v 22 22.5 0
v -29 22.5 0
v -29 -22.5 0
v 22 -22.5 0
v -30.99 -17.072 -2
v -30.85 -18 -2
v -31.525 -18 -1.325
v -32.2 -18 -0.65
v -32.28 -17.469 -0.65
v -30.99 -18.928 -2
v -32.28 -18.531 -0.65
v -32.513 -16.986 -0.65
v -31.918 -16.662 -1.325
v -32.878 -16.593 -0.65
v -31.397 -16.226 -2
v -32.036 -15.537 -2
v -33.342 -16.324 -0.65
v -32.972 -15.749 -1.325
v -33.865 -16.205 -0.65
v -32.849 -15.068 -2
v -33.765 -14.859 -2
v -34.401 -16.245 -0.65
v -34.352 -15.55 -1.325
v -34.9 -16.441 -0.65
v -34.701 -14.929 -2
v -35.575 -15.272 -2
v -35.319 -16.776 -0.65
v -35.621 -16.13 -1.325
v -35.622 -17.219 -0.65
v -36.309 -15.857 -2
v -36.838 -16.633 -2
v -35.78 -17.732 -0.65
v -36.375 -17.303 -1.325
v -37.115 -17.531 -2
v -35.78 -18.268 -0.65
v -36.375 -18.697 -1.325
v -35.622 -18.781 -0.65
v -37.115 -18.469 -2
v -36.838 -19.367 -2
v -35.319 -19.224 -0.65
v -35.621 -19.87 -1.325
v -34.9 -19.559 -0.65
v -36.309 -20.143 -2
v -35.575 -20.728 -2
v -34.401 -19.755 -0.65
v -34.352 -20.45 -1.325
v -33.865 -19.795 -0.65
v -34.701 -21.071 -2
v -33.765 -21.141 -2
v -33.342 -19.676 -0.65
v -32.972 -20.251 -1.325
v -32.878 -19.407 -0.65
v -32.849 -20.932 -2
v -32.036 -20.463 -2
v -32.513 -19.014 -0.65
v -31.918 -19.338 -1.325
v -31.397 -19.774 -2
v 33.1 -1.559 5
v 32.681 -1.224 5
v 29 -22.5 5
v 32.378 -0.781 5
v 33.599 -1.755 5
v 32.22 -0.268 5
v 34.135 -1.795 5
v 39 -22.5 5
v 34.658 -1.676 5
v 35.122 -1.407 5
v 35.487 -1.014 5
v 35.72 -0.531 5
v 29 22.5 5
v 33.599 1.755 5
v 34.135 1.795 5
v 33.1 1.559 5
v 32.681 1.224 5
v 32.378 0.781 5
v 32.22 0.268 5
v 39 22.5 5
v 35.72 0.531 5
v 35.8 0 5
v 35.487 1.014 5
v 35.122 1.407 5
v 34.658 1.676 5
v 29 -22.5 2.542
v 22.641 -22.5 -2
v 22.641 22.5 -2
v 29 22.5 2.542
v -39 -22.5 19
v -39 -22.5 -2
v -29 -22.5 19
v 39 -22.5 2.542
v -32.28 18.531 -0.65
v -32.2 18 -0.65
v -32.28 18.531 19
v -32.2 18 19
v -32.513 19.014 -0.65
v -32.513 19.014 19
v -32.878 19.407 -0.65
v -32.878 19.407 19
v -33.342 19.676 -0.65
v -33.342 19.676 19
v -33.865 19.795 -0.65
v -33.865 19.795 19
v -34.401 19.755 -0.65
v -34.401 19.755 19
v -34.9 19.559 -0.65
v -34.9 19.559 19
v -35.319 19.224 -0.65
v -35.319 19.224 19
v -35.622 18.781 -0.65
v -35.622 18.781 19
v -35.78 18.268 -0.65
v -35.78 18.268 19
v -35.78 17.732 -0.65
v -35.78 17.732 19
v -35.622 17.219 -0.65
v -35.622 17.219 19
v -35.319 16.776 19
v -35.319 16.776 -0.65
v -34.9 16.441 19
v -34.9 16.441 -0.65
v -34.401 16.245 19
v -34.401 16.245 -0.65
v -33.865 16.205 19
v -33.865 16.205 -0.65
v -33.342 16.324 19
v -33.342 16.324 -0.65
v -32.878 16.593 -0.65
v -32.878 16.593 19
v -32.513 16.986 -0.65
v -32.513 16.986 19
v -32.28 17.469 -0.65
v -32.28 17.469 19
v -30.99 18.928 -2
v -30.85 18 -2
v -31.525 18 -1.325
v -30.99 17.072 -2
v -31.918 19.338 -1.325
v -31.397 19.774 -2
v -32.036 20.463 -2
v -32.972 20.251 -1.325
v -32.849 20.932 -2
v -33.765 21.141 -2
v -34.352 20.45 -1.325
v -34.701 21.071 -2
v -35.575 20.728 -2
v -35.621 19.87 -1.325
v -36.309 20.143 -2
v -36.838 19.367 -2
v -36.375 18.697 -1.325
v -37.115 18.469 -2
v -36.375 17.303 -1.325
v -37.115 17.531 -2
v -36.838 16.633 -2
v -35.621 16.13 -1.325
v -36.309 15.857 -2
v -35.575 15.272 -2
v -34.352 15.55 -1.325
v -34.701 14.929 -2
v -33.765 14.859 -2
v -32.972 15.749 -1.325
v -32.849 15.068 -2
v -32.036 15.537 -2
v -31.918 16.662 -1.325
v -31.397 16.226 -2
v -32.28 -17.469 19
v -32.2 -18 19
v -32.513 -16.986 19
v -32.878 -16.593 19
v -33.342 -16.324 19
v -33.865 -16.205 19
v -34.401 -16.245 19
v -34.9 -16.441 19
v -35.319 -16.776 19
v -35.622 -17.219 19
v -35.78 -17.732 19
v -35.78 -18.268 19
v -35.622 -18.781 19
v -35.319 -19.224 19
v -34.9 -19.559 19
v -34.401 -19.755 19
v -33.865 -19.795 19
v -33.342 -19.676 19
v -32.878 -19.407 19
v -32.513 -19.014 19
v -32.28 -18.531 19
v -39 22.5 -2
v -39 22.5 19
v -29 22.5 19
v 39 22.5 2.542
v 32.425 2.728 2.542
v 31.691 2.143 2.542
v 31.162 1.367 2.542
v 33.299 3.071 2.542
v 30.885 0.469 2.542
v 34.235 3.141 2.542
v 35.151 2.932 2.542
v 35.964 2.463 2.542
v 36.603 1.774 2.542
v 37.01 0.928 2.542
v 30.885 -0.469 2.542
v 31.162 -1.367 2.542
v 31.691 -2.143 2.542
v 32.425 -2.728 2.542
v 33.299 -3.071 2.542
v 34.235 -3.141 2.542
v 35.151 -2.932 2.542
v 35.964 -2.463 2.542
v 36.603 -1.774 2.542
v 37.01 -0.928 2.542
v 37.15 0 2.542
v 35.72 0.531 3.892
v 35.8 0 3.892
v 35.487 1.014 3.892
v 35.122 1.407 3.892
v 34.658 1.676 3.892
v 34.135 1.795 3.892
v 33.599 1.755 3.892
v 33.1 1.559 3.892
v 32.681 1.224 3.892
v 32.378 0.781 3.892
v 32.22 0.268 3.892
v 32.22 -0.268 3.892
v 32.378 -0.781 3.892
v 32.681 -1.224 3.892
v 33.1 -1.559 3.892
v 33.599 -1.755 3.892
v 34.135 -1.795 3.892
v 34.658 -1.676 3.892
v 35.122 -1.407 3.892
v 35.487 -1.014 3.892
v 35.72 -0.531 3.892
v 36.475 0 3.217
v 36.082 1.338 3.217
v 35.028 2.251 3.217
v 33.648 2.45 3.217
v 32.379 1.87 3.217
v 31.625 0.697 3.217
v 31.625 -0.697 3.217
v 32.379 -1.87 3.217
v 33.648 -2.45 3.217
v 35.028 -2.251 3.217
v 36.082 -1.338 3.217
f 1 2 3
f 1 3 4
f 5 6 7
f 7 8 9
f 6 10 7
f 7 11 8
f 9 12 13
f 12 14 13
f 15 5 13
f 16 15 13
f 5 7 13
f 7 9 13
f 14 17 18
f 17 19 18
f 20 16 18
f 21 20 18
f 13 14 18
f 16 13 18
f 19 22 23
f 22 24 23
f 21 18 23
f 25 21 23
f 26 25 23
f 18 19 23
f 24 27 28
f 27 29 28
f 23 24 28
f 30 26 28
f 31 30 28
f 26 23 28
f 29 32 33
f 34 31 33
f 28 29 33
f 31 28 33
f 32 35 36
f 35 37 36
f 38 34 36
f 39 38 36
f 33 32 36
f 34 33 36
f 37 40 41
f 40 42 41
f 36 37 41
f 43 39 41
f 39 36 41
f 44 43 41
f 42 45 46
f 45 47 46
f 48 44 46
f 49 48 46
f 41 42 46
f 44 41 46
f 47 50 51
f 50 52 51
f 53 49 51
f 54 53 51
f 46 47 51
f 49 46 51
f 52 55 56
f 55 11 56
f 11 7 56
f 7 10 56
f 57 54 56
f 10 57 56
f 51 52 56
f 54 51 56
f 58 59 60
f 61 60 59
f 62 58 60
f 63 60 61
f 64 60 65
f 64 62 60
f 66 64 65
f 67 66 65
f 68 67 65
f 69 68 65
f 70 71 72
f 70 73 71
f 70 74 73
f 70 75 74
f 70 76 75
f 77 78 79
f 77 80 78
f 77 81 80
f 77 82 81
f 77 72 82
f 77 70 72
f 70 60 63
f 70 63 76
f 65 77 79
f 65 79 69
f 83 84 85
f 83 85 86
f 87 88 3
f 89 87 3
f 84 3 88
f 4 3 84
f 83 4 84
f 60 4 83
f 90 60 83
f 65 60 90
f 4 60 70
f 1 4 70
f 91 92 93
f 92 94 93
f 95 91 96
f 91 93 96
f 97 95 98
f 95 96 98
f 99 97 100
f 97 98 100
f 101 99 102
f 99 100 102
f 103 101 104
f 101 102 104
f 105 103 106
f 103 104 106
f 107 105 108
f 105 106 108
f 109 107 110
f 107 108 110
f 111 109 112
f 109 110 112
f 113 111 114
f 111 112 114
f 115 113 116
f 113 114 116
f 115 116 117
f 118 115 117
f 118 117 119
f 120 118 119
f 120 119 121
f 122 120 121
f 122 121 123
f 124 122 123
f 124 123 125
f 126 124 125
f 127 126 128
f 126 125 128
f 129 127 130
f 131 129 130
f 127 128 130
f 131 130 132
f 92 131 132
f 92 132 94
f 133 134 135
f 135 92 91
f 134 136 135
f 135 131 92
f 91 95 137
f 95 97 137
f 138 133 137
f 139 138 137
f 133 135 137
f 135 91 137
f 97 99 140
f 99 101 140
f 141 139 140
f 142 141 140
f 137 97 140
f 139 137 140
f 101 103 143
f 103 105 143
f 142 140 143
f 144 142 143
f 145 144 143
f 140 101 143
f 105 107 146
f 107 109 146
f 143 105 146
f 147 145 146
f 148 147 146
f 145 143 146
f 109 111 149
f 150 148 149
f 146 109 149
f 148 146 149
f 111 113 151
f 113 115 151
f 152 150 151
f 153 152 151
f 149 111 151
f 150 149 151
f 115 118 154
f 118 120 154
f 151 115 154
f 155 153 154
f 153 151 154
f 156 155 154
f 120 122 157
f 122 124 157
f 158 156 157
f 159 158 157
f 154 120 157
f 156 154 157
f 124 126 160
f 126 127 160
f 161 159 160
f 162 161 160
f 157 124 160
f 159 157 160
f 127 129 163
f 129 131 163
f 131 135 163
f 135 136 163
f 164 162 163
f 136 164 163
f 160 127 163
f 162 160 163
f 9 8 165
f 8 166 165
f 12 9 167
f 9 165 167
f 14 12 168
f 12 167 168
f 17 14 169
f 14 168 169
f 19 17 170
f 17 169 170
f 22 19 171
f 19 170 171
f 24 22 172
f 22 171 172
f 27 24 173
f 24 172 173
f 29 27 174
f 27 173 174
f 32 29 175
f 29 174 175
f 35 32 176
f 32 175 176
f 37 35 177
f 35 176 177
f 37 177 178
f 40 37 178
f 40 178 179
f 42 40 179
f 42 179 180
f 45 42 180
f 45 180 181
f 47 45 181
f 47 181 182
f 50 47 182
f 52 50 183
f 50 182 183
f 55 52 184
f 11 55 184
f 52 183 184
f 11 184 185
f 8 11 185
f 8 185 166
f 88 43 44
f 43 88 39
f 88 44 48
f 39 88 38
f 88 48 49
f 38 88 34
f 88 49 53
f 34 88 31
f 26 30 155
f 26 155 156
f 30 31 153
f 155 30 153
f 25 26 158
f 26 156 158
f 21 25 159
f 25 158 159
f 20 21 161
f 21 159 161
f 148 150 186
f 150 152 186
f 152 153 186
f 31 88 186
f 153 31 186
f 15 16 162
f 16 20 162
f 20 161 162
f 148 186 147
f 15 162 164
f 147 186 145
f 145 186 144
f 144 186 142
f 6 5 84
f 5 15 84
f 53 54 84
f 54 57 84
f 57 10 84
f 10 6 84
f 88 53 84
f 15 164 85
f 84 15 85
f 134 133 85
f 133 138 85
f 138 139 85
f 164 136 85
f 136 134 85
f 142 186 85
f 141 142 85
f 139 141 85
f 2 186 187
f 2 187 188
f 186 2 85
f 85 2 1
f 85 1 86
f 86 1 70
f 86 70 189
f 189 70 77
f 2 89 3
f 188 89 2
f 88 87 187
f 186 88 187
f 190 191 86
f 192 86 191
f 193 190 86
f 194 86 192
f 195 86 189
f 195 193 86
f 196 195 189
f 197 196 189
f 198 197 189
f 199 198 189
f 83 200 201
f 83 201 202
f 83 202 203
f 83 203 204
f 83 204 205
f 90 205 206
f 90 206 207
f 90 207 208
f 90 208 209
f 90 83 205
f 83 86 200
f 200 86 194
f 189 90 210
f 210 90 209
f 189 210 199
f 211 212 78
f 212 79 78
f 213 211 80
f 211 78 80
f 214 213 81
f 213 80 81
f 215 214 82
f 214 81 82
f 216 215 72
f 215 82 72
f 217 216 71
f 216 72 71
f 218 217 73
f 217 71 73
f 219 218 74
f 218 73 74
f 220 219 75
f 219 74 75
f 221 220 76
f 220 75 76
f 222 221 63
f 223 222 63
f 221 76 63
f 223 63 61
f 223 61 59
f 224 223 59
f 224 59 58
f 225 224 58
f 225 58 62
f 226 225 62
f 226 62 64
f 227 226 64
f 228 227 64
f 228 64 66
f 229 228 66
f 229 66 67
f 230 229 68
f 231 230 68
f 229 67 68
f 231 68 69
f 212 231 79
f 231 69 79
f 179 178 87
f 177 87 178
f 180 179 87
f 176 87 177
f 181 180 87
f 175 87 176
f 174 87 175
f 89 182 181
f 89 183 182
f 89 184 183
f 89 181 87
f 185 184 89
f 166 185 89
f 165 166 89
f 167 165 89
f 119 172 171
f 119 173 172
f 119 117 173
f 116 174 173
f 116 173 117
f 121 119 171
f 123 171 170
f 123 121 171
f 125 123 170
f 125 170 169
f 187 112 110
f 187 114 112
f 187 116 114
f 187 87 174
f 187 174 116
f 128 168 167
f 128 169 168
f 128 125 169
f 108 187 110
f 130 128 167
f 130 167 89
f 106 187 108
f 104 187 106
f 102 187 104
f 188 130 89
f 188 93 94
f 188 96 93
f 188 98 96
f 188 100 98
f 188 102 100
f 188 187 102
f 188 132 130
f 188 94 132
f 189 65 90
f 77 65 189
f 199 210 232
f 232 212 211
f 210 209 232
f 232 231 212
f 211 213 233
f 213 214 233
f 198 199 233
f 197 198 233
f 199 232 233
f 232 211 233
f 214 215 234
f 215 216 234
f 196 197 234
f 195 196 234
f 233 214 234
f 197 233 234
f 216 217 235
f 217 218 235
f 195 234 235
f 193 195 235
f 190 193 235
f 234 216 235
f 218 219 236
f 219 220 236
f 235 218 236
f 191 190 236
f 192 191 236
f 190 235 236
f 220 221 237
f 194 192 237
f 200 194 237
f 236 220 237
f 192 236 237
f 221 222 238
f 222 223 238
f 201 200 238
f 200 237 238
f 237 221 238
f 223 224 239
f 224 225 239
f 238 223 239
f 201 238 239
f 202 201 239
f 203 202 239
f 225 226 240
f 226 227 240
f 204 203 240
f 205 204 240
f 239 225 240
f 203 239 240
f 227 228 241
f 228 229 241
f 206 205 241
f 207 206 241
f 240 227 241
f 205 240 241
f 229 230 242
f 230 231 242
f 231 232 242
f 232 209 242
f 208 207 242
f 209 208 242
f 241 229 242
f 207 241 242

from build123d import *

# Parameters (mm, degrees)
SKETCH1_W                                           = 78
SKETCH1_H                                           = 45
SKETCH1_R                                           = 1.65
BOSS_EXTRUDE1_DEPTH                                 = 2
BOSS_EXTRUDE2_START                                 = 5
SKETCH1_3_W                                         = 10
SKETCH1_3_H                                         = 45
SKETCH1_3_R                                         = 1.65
BOSS_EXTRUDE2_DEPTH                                 = 5
BOSS_EXTRUDE3_START                                 = 19
SKETCH1_4_W                                         = 10
SKETCH1_4_H                                         = 45
SKETCH1_4_R                                         = 1.65
BOSS_EXTRUDE3_DEPTH                                 = 19
CHAMFER2_SIZE2                                      = 5
CHAMFER2_SIZE                                       = 7
CUT_EXTRUDE1_DEPTH                                  = 63
CSK_FOR_M3_COUNTERSUNK_FLAT_HEAD_SCREW1_D           = 3.6
CSK_FOR_M3_COUNTERSUNK_FLAT_HEAD_SCREW1_CSINK_D     = 6.3
CSK_FOR_M3_COUNTERSUNK_FLAT_HEAD_SCREW1_CSINK_ANGLE = 90
CSK_FOR_M3_COUNTERSUNK_FLAT_HEAD_SCREW2_D           = 3.6
CSK_FOR_M3_COUNTERSUNK_FLAT_HEAD_SCREW2_CSINK_D     = 6.3
CSK_FOR_M3_COUNTERSUNK_FLAT_HEAD_SCREW2_CSINK_ANGLE = 90


with BuildPart() as part:
    # Sketch1 → Boss-Extrude1 (new body)
    with BuildSketch(Plane.XY):
        Rectangle(SKETCH1_W, SKETCH1_H)
        with Locations((34, 0)):
            Circle(SKETCH1_R, mode=Mode.SUBTRACT)
        with Locations((-34, -18)):
            Circle(SKETCH1_R, mode=Mode.SUBTRACT)
        with Locations((-34, 18)):
            Circle(SKETCH1_R, mode=Mode.SUBTRACT)
    extrude(amount=-BOSS_EXTRUDE1_DEPTH)

    # Sketch1<3> → Boss-Extrude2 (add)
    # profile 1 of 2: a face of its own
    with BuildSketch(Plane.XY.offset(BOSS_EXTRUDE2_START)):
        with Locations((-34, 0)):
            Rectangle(SKETCH1_3_W, SKETCH1_3_H)
        with Locations((-34, -18)):
            Circle(SKETCH1_3_R, mode=Mode.SUBTRACT)
        with Locations((-34, 18)):
            Circle(SKETCH1_3_R, mode=Mode.SUBTRACT)
    # profile 2 of 2: a face of its own
    with BuildSketch(Plane.XY.offset(BOSS_EXTRUDE2_START)):
        with Locations((34, 0)):
            Rectangle(SKETCH1_3_W, SKETCH1_3_H)
        with Locations((34, 0)):
            Circle(SKETCH1_3_R, mode=Mode.SUBTRACT)
    extrude(amount=-BOSS_EXTRUDE2_DEPTH)

    # Sketch1<4> → Boss-Extrude3 (add)
    with BuildSketch(Plane.XY.offset(BOSS_EXTRUDE3_START)):
        with Locations((-34, 0)):
            Rectangle(SKETCH1_4_W, SKETCH1_4_H)
        with Locations((-34, -18)):
            Circle(SKETCH1_4_R, mode=Mode.SUBTRACT)
        with Locations((-34, 18)):
            Circle(SKETCH1_4_R, mode=Mode.SUBTRACT)
    extrude(amount=-BOSS_EXTRUDE3_DEPTH)

    # Chamfer2
    chamfer2_edges = [part.edges().sort_by_distance(p)[0] for p in [
        (29, 0, 0),
    ]]
    chamfer2_side = [part.faces().sort_by_distance(p)[0] for p in [
        (28.9, 0, 0),
    ]]
    chamfer(chamfer2_edges, length=CHAMFER2_SIZE - 0.0001, length2=CHAMFER2_SIZE2 - 0.0001, reference=chamfer2_side[0])  # a hair under: the kernel refuses the full size

    # Sketch2 → Cut-Extrude1 (cut)
    with BuildSketch(Plane.XZ.offset(22.5)):
        Polygon((22.640930107, -2), (29, 2.542192781), (39, 2.542192781), (39, -2), align=None)
    extrude(amount=-CUT_EXTRUDE1_DEPTH, mode=Mode.SUBTRACT)

    # CSK for M3 Countersunk Flat Head Screw1 (through all)
    with Locations(Plane(origin=(0, 0, 2.542192781), x_dir=(-1, 0, 0), z_dir=(0, 0, -1))):
        with Locations((-34, 0)):
            CounterSinkHole(CSK_FOR_M3_COUNTERSUNK_FLAT_HEAD_SCREW1_D / 2, CSK_FOR_M3_COUNTERSUNK_FLAT_HEAD_SCREW1_CSINK_D / 2, counter_sink_angle=CSK_FOR_M3_COUNTERSUNK_FLAT_HEAD_SCREW1_CSINK_ANGLE)

    # CSK for M3 Countersunk Flat Head Screw2 (through all)
    with Locations(Plane(origin=(0, 0, -2), x_dir=(-1, 0, 0), z_dir=(0, 0, -1))):
        with Locations((34, -18), (34, 18)):
            CounterSinkHole(CSK_FOR_M3_COUNTERSUNK_FLAT_HEAD_SCREW2_D / 2, CSK_FOR_M3_COUNTERSUNK_FLAT_HEAD_SCREW2_CSINK_D / 2, counter_sink_angle=CSK_FOR_M3_COUNTERSUNK_FLAT_HEAD_SCREW2_CSINK_ANGLE)


solid = part.part
